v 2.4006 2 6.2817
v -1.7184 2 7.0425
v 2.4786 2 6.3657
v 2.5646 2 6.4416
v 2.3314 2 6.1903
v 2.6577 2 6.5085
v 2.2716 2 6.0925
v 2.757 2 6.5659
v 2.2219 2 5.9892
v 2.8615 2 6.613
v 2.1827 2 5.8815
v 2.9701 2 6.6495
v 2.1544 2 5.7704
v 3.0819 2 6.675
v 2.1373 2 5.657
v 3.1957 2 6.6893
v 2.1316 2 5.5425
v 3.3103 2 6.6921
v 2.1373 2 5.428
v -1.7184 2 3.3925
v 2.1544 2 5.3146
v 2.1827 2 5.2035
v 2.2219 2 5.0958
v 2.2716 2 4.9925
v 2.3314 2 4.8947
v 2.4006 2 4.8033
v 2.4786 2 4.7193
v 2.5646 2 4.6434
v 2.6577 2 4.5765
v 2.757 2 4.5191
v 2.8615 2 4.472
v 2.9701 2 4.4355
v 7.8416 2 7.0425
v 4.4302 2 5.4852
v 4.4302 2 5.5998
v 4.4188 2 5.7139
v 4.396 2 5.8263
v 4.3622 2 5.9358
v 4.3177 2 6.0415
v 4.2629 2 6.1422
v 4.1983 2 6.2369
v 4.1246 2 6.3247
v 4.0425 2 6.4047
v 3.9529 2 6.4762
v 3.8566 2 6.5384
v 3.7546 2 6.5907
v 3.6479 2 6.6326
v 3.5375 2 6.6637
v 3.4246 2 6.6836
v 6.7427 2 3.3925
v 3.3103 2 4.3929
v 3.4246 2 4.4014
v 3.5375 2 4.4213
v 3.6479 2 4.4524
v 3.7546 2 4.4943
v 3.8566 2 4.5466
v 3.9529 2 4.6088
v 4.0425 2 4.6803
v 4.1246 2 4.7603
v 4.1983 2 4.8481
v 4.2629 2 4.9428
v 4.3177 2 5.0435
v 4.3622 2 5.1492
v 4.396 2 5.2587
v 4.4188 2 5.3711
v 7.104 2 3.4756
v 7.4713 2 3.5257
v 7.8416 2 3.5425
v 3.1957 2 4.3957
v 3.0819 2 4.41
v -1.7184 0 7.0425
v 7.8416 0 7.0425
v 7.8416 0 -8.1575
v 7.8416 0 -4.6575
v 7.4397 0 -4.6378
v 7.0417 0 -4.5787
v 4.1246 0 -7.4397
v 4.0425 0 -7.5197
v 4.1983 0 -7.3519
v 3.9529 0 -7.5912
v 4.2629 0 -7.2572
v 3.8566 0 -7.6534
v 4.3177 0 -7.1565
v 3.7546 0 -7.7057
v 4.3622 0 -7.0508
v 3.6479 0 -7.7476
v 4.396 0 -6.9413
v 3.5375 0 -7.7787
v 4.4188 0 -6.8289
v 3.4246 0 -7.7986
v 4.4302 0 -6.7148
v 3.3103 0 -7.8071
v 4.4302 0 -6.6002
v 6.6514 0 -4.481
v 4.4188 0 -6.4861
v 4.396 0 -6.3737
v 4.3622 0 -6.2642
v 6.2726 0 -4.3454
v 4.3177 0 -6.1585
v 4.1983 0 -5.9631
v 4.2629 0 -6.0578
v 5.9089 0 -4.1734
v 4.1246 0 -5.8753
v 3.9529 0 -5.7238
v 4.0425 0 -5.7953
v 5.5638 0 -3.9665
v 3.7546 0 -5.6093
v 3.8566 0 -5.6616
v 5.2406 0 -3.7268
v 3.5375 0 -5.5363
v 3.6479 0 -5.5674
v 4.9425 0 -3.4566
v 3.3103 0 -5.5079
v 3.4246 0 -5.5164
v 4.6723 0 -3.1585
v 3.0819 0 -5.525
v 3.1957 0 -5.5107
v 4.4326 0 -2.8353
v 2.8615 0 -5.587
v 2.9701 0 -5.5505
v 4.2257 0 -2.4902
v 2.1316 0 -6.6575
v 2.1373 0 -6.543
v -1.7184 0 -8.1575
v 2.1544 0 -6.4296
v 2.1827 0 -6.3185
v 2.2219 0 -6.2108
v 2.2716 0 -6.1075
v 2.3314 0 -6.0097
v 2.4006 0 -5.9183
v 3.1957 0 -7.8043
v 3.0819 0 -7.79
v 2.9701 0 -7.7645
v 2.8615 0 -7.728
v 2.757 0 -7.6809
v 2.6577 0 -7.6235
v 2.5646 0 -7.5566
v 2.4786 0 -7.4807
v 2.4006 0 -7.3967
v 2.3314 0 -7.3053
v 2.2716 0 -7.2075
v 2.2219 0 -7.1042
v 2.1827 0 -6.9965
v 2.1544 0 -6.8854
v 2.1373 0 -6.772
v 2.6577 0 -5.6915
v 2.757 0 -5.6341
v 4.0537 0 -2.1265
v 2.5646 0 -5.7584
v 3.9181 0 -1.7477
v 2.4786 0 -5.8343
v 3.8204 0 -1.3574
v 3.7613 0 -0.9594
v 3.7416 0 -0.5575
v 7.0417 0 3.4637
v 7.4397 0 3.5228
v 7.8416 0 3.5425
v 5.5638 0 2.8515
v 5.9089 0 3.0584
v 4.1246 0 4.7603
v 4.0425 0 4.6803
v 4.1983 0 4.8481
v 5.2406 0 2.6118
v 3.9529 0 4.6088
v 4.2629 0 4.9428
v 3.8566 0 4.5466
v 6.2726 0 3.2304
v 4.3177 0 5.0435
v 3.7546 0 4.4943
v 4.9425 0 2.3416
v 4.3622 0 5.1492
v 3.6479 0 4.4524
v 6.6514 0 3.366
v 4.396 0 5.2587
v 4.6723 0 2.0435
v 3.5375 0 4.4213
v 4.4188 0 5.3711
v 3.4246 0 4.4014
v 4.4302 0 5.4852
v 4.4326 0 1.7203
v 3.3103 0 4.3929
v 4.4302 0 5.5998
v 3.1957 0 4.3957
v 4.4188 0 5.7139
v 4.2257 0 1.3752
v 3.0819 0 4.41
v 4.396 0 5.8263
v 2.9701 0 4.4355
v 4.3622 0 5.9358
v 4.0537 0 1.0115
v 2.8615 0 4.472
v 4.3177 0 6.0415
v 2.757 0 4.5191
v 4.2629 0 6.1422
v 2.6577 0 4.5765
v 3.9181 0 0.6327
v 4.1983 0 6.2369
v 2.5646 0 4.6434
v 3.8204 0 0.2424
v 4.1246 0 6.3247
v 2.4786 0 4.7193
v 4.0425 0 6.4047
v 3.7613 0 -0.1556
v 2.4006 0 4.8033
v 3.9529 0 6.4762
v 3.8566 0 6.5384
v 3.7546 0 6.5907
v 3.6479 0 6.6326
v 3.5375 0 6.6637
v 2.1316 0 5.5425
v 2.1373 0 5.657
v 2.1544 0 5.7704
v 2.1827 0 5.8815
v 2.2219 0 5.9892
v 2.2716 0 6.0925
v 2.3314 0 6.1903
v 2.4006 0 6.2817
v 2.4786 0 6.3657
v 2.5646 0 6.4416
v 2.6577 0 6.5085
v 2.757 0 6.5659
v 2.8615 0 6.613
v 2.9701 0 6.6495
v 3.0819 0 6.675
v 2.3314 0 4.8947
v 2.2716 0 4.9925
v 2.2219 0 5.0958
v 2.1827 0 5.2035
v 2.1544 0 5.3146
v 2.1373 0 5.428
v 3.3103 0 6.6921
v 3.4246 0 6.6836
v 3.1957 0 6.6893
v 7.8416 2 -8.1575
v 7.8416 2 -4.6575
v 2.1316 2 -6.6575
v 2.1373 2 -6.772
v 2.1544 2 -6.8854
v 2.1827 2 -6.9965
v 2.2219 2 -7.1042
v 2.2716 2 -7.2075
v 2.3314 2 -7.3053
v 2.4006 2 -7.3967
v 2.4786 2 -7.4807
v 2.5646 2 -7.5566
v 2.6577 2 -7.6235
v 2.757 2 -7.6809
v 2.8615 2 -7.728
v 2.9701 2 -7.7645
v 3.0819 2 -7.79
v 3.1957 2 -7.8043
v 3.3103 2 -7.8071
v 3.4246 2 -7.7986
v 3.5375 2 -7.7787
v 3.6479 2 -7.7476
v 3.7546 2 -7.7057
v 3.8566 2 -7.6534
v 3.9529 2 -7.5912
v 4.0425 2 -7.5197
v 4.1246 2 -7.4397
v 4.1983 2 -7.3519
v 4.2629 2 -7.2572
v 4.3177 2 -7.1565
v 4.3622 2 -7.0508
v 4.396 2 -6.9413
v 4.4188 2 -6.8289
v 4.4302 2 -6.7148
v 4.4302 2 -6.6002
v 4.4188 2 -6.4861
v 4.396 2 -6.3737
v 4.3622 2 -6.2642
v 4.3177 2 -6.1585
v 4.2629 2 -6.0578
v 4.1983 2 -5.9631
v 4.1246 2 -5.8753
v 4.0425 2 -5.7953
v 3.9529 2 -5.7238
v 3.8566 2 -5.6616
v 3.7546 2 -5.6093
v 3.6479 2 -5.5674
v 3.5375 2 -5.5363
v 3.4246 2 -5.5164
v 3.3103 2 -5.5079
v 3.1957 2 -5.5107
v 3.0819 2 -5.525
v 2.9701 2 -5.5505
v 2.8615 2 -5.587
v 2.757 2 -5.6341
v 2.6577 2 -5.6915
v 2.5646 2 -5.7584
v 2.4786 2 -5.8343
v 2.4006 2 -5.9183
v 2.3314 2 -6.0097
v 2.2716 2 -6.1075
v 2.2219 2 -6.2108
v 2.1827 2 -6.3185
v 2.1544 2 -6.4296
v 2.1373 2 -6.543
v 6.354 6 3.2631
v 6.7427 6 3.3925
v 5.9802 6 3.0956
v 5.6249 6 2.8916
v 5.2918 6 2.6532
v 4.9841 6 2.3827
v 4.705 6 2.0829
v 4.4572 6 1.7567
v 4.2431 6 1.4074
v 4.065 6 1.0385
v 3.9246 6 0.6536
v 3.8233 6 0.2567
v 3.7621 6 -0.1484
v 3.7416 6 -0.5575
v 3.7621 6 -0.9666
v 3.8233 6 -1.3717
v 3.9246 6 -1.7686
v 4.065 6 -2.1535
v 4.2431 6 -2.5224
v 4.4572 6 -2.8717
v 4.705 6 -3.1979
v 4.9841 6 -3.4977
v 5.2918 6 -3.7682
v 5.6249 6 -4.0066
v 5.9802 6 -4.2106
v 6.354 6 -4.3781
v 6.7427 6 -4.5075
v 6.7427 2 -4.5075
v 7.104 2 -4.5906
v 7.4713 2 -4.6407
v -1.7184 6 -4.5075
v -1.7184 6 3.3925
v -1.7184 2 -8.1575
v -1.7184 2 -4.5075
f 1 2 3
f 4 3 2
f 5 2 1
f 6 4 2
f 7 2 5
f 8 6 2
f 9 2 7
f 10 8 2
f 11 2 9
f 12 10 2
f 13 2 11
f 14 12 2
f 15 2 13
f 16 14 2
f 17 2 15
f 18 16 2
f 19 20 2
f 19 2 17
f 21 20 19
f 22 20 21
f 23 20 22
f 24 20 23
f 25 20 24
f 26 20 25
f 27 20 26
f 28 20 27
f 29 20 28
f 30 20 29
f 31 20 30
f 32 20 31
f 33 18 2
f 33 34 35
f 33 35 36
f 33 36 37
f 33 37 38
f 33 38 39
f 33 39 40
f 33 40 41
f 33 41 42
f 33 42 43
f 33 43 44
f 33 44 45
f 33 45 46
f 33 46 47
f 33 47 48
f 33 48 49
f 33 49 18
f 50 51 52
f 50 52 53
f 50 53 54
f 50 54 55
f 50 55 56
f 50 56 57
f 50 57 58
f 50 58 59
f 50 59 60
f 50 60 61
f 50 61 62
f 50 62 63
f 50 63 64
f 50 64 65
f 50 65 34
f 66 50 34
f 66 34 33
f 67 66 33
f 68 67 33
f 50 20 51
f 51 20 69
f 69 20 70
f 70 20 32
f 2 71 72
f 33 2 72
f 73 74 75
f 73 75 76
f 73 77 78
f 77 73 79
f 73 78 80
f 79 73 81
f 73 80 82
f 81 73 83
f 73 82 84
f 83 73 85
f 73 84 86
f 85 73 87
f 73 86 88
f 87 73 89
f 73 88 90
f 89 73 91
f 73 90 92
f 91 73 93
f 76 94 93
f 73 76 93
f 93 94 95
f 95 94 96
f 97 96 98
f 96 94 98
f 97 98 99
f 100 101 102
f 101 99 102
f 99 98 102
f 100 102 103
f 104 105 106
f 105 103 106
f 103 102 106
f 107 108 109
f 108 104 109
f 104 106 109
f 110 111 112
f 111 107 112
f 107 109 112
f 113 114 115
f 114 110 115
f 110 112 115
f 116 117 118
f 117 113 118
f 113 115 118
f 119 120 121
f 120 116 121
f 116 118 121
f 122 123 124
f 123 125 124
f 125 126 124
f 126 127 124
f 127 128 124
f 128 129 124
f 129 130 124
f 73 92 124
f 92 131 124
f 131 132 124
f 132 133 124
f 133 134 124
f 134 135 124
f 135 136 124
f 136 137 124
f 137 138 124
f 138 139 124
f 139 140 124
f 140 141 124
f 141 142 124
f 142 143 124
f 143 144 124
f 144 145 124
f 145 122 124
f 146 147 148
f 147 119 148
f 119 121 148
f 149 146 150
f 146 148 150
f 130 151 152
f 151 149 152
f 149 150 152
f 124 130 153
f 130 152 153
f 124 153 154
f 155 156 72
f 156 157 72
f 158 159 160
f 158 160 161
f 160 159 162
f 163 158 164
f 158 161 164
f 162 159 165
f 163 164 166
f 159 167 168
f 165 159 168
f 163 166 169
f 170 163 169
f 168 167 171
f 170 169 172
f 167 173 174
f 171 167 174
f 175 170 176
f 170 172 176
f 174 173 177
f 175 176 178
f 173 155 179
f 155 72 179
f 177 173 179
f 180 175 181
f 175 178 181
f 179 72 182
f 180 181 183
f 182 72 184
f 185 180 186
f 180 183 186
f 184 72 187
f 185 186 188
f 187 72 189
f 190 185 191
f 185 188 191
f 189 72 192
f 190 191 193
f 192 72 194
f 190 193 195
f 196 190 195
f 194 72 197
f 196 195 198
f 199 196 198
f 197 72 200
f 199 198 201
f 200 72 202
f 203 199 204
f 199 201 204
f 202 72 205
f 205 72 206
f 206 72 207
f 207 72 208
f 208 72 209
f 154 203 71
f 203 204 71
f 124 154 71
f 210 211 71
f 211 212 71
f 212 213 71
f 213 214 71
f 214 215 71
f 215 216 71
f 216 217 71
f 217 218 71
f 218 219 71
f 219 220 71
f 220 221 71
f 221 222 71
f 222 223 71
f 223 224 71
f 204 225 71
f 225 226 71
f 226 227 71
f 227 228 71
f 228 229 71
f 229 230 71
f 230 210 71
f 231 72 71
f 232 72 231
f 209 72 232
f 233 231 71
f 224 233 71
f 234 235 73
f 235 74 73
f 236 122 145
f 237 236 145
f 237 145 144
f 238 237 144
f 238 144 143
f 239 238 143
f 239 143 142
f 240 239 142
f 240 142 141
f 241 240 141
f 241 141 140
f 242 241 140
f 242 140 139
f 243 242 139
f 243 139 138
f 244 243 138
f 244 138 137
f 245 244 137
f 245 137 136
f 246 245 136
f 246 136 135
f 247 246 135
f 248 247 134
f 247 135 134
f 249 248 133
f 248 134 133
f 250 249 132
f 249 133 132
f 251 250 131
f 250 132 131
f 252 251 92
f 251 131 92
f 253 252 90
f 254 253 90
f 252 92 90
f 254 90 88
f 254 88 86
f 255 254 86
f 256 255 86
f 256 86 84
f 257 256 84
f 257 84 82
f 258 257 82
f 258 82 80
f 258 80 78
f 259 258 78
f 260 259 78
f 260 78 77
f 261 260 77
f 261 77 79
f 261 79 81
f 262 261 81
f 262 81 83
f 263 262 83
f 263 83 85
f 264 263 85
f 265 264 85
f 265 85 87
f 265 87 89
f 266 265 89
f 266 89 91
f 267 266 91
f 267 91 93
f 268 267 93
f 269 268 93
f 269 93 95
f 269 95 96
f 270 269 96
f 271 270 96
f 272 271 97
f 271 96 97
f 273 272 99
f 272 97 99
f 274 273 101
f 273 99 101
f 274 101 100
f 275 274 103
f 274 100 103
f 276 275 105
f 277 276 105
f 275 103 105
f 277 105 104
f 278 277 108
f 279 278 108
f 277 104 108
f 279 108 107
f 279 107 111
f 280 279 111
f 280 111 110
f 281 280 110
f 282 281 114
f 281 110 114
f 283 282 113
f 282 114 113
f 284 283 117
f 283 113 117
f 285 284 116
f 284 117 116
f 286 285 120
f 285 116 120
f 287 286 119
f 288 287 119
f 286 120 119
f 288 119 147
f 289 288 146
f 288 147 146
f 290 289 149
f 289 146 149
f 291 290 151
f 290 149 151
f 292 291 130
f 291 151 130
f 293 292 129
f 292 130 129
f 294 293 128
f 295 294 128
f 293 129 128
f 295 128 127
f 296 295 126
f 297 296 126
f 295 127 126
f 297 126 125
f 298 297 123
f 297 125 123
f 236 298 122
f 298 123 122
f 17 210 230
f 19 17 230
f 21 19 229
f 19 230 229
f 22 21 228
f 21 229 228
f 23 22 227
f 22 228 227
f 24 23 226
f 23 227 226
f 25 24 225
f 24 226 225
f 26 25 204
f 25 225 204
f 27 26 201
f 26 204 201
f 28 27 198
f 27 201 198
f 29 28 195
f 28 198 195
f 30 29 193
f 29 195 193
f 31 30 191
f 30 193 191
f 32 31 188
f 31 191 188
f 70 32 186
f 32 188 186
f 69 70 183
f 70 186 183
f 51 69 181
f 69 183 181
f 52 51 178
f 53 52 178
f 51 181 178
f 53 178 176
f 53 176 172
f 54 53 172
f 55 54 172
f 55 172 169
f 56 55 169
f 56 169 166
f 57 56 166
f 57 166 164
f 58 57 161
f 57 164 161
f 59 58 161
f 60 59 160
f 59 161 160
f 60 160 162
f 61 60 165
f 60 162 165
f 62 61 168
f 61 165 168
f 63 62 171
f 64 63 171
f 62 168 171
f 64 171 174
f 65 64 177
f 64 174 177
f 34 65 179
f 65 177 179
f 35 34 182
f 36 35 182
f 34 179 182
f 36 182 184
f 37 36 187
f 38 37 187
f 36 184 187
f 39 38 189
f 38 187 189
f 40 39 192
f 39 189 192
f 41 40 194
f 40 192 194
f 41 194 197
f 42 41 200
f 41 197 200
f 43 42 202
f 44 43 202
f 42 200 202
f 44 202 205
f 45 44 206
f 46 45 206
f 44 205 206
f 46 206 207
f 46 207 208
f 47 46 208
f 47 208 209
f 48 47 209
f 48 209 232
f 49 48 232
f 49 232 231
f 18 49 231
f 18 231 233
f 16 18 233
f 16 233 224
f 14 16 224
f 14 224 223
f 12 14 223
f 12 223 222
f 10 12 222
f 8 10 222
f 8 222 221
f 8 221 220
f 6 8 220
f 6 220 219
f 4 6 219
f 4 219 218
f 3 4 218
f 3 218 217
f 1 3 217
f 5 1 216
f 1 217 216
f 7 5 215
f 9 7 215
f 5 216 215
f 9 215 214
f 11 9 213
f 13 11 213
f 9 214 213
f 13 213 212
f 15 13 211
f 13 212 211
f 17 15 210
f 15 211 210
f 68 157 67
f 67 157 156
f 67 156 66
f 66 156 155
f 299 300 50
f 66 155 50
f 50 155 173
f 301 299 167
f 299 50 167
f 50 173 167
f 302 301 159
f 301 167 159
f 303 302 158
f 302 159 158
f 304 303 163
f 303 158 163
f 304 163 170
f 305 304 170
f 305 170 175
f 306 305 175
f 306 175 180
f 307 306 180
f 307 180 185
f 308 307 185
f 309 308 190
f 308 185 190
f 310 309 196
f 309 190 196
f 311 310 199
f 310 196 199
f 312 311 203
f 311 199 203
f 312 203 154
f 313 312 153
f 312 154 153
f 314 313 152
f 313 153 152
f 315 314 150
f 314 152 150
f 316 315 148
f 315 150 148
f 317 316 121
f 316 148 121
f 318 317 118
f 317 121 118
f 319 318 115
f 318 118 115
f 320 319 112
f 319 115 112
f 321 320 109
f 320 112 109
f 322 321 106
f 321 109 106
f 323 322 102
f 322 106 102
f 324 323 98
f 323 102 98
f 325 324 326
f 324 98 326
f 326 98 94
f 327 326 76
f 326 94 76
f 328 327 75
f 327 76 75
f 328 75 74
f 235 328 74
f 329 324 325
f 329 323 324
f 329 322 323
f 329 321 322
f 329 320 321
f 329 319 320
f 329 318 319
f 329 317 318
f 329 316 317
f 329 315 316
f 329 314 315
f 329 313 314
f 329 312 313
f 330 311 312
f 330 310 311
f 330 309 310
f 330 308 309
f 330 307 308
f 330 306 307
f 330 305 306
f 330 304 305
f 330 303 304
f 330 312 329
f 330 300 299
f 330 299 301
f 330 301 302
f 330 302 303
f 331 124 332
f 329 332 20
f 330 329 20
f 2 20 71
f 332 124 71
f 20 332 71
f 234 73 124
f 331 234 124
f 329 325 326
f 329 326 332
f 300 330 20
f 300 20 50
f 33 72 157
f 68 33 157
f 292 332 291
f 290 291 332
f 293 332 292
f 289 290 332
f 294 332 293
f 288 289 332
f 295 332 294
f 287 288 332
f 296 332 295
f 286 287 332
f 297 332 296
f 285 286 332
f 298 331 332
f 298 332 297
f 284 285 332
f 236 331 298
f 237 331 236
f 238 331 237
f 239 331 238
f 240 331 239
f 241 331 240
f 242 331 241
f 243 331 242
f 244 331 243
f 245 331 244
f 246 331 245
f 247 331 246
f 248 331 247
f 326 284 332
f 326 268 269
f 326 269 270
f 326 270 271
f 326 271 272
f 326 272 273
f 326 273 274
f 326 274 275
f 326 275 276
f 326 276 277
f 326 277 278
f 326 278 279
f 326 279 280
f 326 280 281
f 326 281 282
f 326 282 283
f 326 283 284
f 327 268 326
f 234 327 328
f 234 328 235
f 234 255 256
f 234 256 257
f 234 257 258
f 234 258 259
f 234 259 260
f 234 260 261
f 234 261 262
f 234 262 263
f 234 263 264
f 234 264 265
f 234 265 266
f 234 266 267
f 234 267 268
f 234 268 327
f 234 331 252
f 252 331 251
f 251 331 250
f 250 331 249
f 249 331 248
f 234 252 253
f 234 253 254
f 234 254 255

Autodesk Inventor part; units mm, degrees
ref_plane "YZ Plane" through (0, 0, 0) normal (1, 0, 0) x (0, 1, 0)
ref_plane "XZ Plane" through (0, 0, 0) normal (0, 1, 0) x (-1, 0, 0)
ref_plane "XY Plane" through (0, 0, 0) normal (0, 0, 1) x (1, 0, 0)
sketch "Sketch1" plane through (0, 0, 0) normal (0, 1, 0) x (-1, 0, 0)
  line L0 (1.7184, 7.0425) -> (-7.8416, 7.0425)
  line L1 (-7.8416, -8.1575) -> (1.7184, -8.1575)
  line L2 (1.7184, -8.1575) -> (1.7184, 7.0425)
  circle A0 centre (-3.2816, 5.5425) radius 1.15
  circle A1 centre (-3.2816, -6.6575) radius 1.15
  line L3 (-7.8416, 7.0425) -> (-7.8416, 3.5425)
  line L4 (-7.8416, -4.6575) -> (-7.8416, -8.1575)
  arc A2 (-7.8416, -4.6575) -> (-7.8416, 3.5425) centre (-7.8416, -0.5575) ccw
  point P0 (0, 0)
  dimension "d0" = 15.2
  dimension "d2" = 5
  dimension "d3" = 5
  dimension "d4" = 1.5
  dimension "d5" = 1.5
  dimension "d6" = 2.3
  dimension "d7" = 2.3
  dimension "d11" = 9.56
  dimension "d12" = 8.2
  dimension "d13" = 7.6
extrude "Extrusion1" add sketch "Sketch1" along normal blind 6
sketch "Sketch2" plane through (0, 6, 0) normal (0, 1, 0) x (1, 0, 0)
  line L0 (-1.7184, -7.0425) -> (7.8416, -7.0425) projected
  line L1 (-1.7184, 8.1575) -> (-1.7184, -7.0425) projected
  line L2 (7.8416, -7.0425) -> (-1.7184, -7.0425)
  line L3 (-1.7184, -7.0425) -> (-1.7184, -3.3925)
  line L4 (-1.7184, -3.3925) -> (7.8416, -3.3925)
  line L5 (7.8416, -3.3925) -> (7.8416, -7.0425)
  line L6 (7.8416, 4.5075) -> (-1.7184, 4.5075)
  line L7 (-1.7184, 4.5075) -> (-1.7184, 8.1575)
  line L8 (-1.7184, 8.1575) -> (7.8416, 8.1575)
  line L9 (7.8416, 8.1575) -> (7.8416, 4.5075)
  point P0 (0, 0)
  dimension "d14" = 3.65
  dimension "d19" = 3.65
extrude "Extrusion2" cut sketch "Sketch2" against normal blind 4 contours L1 L4 L5 L0
extrude "Extrusion3" cut sketch "Sketch2" against normal blind 4 contours L1 L8 L9 L6
properties part number "UCover_SMA"
